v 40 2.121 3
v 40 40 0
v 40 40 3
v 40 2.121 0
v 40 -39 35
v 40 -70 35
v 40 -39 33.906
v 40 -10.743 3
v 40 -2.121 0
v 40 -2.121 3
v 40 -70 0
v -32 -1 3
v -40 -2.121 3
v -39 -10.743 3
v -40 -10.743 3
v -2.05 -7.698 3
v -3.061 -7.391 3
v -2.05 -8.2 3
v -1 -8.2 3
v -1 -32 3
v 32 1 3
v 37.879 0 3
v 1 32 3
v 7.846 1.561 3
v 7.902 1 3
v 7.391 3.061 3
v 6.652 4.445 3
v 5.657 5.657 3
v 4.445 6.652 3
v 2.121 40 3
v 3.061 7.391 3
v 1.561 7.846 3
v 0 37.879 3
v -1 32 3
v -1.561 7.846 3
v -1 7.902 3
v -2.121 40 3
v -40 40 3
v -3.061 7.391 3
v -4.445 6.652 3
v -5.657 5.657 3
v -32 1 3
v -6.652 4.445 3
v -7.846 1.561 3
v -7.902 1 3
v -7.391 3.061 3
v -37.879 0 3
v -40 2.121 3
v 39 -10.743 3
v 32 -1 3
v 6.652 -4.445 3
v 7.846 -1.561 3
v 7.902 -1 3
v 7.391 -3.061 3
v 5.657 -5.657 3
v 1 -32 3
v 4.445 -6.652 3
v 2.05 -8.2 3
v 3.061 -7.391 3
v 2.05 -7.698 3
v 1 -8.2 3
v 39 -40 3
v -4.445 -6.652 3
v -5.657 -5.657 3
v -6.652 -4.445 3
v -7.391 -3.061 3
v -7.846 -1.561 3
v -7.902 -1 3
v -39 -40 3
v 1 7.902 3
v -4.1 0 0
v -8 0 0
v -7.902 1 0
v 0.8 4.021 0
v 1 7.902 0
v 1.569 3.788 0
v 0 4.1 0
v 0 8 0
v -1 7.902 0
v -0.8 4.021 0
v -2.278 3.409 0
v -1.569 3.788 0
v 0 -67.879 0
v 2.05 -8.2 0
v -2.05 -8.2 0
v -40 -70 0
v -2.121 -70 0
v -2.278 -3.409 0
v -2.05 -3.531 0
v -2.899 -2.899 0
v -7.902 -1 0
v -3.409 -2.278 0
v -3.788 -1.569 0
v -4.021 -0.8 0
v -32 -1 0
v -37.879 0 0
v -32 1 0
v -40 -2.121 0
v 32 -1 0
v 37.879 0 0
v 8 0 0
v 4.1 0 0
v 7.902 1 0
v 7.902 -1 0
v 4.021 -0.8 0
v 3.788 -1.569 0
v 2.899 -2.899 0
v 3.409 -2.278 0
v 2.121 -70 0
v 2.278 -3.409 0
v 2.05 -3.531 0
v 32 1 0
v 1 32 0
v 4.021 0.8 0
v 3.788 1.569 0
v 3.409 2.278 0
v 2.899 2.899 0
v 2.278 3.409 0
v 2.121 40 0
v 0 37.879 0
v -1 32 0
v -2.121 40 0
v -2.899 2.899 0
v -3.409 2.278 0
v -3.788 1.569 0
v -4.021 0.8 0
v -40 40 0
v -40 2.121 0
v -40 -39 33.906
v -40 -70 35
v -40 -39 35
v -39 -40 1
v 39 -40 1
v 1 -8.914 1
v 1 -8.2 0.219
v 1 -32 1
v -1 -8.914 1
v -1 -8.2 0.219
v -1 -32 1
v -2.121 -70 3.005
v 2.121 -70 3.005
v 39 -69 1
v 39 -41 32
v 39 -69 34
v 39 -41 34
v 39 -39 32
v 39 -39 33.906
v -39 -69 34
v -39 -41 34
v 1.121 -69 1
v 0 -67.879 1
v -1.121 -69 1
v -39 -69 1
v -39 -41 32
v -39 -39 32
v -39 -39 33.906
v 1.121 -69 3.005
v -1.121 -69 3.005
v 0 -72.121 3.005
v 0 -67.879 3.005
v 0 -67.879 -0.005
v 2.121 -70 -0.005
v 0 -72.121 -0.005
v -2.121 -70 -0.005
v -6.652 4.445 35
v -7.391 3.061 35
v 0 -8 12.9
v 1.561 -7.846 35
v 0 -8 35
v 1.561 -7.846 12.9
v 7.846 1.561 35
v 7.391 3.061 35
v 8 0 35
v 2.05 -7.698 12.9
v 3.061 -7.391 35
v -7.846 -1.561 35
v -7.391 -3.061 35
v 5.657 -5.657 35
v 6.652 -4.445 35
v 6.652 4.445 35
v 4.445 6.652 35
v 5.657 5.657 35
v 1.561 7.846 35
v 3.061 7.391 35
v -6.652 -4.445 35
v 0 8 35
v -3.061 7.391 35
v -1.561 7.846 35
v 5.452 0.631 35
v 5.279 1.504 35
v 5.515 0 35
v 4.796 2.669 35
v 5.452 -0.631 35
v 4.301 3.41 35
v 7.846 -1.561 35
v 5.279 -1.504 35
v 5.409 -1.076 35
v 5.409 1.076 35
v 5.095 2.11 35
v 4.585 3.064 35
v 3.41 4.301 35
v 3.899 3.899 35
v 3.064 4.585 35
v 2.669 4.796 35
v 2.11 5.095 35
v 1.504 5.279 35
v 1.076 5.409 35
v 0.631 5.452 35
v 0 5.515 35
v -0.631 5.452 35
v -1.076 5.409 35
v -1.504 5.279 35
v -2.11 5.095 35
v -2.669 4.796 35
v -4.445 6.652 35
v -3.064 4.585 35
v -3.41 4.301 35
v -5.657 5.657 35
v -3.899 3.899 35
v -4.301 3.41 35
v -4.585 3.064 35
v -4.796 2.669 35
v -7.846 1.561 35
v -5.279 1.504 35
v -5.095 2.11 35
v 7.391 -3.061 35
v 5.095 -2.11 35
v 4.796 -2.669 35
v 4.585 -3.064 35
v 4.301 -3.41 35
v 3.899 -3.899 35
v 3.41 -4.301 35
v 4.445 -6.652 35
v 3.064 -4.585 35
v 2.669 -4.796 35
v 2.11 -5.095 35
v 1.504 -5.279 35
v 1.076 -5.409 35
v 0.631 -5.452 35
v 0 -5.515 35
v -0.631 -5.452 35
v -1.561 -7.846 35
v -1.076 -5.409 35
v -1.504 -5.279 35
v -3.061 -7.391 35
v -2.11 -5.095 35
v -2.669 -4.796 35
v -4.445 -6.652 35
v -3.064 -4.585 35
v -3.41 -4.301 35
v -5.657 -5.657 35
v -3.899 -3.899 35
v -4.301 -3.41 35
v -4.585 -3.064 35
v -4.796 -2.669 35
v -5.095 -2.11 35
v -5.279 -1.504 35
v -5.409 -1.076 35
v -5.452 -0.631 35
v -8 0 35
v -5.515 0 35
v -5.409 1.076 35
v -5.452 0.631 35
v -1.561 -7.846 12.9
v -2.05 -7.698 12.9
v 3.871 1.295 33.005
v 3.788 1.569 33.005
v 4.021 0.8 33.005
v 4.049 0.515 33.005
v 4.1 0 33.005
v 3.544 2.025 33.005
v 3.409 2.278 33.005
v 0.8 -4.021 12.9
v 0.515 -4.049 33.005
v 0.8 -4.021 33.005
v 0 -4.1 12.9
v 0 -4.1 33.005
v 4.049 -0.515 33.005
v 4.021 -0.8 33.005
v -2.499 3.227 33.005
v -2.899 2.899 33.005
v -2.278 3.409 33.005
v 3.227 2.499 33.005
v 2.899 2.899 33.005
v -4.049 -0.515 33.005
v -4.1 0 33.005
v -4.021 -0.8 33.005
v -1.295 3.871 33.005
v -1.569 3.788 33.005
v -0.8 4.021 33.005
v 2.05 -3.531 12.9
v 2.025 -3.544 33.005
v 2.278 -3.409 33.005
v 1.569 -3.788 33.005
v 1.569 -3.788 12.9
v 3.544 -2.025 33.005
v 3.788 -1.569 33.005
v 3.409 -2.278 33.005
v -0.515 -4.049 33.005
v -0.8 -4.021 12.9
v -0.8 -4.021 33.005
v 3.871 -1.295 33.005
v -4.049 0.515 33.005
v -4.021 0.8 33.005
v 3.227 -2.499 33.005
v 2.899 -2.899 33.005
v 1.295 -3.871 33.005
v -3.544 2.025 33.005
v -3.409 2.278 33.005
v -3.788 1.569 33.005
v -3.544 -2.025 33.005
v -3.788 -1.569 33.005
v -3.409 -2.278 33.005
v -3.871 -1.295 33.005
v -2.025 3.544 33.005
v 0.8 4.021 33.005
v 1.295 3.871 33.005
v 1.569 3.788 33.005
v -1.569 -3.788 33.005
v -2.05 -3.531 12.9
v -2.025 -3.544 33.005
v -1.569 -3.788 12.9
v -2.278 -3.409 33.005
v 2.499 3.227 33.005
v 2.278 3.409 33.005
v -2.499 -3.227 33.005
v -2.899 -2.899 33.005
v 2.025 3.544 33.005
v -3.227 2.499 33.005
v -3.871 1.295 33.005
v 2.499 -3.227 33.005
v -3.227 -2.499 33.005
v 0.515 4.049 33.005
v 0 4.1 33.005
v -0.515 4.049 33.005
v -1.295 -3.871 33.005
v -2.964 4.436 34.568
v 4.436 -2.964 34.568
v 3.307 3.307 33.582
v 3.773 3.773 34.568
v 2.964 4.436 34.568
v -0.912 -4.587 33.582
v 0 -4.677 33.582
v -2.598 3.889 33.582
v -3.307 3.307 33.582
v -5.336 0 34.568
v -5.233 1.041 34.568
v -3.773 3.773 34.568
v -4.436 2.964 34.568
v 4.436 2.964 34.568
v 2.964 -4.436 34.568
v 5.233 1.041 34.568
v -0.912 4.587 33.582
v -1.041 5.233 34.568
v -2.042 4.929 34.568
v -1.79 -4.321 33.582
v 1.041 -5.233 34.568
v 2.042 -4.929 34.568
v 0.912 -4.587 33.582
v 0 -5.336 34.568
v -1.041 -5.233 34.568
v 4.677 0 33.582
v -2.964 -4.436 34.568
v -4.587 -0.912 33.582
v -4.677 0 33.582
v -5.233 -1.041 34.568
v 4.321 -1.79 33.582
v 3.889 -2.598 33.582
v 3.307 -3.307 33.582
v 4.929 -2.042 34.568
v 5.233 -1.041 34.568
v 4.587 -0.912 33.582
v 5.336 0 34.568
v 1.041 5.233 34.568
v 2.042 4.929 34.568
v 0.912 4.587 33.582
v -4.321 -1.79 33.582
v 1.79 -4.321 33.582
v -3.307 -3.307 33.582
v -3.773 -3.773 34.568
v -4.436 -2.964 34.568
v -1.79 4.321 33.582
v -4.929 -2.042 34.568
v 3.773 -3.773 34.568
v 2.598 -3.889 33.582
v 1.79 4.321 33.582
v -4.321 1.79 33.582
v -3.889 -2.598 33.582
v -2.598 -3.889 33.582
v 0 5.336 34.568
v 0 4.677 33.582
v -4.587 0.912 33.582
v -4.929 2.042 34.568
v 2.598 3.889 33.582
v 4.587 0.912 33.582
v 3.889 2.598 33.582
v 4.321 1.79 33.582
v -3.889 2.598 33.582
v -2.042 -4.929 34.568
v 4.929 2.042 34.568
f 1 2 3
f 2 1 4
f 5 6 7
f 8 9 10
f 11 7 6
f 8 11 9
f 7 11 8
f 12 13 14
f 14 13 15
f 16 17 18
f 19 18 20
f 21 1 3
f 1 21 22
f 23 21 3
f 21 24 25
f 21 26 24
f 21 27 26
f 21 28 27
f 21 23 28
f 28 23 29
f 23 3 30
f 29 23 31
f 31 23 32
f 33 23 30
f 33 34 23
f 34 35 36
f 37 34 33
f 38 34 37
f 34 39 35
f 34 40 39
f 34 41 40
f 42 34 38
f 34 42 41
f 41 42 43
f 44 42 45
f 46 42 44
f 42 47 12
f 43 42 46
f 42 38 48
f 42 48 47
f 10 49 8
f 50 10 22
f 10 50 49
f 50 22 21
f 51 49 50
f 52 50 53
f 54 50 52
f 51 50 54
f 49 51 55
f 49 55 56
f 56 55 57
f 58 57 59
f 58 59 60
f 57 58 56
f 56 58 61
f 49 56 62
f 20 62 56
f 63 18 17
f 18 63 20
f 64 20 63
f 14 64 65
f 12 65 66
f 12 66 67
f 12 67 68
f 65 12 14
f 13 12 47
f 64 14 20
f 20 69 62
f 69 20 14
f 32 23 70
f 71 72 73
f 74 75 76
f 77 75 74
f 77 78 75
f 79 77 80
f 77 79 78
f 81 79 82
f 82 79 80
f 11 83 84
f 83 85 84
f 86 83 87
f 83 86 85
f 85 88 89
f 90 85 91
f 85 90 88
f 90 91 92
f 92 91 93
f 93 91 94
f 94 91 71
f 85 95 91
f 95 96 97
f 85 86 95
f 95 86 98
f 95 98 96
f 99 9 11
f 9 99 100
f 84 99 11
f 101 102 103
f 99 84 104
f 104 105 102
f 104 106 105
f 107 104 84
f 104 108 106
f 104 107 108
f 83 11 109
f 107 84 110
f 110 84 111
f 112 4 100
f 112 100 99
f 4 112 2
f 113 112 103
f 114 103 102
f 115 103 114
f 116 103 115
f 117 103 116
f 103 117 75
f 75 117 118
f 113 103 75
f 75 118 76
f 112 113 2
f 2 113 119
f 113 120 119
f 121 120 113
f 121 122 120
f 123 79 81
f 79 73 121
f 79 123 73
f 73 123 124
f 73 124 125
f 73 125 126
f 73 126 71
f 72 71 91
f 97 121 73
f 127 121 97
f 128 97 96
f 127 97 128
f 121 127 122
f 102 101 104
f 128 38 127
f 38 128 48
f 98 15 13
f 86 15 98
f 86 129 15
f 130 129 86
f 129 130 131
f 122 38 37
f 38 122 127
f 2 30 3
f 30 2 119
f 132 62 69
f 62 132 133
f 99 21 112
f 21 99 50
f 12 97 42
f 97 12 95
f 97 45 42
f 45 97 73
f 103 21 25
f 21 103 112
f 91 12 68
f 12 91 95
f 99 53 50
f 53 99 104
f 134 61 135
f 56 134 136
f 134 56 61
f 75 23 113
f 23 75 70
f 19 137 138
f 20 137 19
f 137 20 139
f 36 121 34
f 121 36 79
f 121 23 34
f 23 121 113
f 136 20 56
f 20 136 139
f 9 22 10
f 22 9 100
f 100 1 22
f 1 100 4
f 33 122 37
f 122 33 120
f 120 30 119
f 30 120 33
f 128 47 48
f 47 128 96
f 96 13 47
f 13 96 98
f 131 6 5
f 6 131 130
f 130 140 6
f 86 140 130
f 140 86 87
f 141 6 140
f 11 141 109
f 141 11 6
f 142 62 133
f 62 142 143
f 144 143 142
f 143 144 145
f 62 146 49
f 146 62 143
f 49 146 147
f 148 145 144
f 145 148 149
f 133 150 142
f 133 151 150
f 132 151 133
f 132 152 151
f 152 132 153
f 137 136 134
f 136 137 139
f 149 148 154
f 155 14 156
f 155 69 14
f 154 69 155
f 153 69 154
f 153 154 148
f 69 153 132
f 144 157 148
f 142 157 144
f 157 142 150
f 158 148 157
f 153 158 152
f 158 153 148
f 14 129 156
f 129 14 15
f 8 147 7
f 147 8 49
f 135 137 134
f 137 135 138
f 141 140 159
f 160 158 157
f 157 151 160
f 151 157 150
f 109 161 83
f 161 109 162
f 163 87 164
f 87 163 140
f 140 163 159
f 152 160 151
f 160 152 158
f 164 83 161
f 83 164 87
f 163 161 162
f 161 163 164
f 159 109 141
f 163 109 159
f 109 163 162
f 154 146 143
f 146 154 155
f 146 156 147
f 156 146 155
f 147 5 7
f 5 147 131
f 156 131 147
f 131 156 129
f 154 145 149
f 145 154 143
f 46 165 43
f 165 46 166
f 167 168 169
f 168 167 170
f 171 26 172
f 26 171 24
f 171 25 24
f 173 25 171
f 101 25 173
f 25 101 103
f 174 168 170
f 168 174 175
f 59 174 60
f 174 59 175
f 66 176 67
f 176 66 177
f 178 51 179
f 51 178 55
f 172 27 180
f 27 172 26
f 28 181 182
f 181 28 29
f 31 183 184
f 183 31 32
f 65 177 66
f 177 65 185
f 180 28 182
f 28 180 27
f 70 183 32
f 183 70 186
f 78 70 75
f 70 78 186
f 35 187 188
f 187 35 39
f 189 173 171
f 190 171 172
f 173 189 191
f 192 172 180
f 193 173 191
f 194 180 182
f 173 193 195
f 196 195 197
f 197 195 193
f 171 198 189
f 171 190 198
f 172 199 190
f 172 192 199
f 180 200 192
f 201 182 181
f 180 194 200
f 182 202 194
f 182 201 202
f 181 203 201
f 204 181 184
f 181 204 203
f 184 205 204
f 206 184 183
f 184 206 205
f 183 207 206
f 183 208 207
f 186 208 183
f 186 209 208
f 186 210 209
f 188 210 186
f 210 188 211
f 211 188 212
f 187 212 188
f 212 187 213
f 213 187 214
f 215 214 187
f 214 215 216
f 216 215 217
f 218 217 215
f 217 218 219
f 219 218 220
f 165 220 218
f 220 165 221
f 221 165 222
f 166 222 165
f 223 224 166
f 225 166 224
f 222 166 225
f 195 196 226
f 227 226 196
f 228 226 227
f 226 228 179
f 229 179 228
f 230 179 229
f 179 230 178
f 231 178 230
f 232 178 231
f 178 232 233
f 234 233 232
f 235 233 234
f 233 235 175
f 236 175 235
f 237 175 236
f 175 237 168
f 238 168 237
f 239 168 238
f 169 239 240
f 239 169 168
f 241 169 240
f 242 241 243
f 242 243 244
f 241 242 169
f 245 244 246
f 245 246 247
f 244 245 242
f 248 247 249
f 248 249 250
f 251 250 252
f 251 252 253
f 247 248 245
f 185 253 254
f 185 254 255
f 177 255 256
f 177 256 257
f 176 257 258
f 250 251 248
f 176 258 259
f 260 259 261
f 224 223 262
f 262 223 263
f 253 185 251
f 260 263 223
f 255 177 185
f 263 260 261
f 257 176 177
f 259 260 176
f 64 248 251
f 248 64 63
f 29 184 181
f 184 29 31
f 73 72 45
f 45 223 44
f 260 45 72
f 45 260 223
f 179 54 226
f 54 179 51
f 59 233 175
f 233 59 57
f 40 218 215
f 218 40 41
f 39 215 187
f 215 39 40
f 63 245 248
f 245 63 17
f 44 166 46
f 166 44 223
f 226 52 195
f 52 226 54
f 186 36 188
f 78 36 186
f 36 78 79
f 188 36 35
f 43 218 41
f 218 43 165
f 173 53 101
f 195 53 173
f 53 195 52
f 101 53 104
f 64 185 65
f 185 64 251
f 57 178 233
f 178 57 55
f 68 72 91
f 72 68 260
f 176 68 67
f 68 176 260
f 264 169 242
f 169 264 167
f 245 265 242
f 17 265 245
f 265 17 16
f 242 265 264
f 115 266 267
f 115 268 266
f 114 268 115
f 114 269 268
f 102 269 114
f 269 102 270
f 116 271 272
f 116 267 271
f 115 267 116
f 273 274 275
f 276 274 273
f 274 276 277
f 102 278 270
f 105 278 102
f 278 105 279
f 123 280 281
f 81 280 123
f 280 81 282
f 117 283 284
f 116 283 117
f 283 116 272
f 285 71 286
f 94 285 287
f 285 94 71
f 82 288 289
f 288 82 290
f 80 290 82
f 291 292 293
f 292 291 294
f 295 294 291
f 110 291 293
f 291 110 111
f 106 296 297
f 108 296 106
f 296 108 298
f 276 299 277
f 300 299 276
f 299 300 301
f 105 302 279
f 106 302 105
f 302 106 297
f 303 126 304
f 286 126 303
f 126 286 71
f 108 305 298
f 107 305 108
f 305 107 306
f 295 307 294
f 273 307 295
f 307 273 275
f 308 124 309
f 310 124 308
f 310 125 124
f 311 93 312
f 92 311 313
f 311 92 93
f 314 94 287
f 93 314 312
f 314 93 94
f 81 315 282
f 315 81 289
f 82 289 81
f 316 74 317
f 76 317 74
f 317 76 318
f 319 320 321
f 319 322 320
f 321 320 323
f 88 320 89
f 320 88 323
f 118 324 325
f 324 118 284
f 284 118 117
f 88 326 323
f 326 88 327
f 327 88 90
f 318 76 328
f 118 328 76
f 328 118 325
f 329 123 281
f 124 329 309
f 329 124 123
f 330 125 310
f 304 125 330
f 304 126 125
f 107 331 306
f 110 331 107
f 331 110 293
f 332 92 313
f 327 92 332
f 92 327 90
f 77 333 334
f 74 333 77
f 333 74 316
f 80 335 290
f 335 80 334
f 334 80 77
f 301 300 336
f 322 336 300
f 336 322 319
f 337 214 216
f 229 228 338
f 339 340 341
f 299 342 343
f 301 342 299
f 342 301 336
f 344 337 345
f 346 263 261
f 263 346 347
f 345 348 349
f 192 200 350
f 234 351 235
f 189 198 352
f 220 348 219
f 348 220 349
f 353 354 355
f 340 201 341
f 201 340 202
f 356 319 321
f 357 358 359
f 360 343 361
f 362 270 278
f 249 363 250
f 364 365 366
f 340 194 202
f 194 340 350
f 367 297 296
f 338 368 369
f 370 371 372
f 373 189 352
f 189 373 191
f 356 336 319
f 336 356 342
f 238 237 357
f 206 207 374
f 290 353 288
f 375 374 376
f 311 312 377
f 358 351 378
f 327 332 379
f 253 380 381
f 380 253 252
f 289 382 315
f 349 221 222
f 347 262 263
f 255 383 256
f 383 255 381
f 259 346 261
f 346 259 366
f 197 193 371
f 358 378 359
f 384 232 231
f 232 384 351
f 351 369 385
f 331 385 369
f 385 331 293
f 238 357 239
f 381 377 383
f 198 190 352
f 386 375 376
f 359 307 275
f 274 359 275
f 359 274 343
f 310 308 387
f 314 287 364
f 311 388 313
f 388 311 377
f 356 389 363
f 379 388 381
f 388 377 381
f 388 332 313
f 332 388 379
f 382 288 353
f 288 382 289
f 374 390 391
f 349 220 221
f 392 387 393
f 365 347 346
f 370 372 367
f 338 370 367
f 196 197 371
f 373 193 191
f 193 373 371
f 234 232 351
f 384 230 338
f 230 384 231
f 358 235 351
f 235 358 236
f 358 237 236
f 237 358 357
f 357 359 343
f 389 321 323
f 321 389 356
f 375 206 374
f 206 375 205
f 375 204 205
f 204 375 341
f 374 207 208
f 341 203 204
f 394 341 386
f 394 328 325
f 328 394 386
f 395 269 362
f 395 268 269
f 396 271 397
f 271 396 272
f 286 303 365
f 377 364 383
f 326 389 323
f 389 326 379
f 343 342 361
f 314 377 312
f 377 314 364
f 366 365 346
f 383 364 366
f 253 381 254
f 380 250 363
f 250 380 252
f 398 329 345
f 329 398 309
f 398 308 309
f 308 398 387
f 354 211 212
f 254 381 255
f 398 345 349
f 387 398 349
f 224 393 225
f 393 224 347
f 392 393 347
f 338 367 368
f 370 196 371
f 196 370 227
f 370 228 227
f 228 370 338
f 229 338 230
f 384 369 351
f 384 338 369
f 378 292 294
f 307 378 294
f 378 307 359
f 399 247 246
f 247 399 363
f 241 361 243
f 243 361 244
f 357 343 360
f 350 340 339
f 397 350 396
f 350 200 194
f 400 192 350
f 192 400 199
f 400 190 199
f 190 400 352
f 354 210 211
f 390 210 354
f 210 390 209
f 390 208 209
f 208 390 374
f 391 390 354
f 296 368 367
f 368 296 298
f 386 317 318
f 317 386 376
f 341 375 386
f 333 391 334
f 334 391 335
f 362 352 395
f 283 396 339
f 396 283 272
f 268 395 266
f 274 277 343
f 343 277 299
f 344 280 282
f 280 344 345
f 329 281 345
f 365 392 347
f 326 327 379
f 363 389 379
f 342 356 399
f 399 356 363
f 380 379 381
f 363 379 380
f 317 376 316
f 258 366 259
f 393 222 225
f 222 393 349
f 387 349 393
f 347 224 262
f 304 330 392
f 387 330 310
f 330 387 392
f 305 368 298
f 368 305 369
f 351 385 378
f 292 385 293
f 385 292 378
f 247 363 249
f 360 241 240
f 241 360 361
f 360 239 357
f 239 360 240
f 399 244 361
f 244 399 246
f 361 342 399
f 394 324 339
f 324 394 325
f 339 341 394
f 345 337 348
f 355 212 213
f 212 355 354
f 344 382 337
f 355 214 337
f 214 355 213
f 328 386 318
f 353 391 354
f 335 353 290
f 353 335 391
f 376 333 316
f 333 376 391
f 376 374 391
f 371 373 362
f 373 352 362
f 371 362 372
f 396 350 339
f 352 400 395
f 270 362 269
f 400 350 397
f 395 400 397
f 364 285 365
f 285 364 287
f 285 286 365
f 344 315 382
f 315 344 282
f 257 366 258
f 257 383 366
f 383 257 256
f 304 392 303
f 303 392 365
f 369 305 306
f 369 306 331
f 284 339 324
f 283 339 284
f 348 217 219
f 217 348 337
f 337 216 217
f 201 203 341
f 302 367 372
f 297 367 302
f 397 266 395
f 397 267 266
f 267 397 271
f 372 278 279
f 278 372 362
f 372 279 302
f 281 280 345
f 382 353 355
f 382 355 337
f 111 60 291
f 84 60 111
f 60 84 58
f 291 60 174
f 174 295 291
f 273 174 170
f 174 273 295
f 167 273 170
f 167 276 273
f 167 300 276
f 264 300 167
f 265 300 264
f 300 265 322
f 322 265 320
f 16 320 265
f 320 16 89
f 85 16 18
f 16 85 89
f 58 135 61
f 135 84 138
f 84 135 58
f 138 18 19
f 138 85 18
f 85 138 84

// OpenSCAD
// Drillguide and sawduct collector for drilling on wall
// By Leo Liang, 2018-7-28
//
// Remix on https://www.thingiverse.com/thing:3013962, by Coat, 08-jul-2018
// Licensed under the Creative Commons - Attribution license.

//Primary parameters
//diameter drill (mm), add a little tolerance
drill_diameter = 8.2;
//height of the  guidetube (mm)
guide_height = 35;
//width of the guidetube (mm)
guide_diameter = 16;
//thickness of the baseplate (mm)
plate_thick = 3;
//width of the baseplate (mm)
plate_width = 80;
// width of the sawdust collector (mm)
collector_width = 80; 
//depth of the sawdust collector (mm)
collector_depth = 30; 
//height of the sawdust collector (mm)
collector_height = 35; 
// thickness of the wall of the collector (mm)
collector_thick = 1;

module plate(w,t)
{
  translate([0,0,0.5 * plate_thick]) difference()
  {
    cube([w, w, t], center=true);
    cube([w/1.25, guidlinew, guide_height],center = true);
    cube([guidlinew, w/1.25, guide_height],center = true);
    
    translate([0.5*plate_width,0,-plate_thick/2])
      nodge();
    translate([0,0.5*plate_width,-plate_thick/2])
      nodge();
    translate([-0.5*plate_width,0,-plate_thick/2])
      nodge();
  }
} 

module nodge()
{
  translate([0,0,plate_thick/2]) rotate([0,0,45])
    cube([3,3,plate_thick+0.01], center=true);
}

module collector() {
  offset = min(collector_height, (plate_width-guide_diameter)/2);
  depth = collector_depth + offset;
  difference() {
    translate([0, offset/2, collector_height/2]) cube([collector_width, depth, collector_height], center=true);
    translate([0, offset/2+collector_thick, collector_height/2])
      cube([collector_width-collector_thick*2, depth, collector_height-collector_thick*2], center=true);
  	multmatrix(m=[[1, 0, 0, -collector_width/2-1],
  								[0, 1, -offset/collector_height, collector_depth/2+offset],
	  							[0, 0, 1, 0],
		  						[0, 0, 0, 1]])

      cube([collector_width+2, offset+1, collector_height+1]);
  }
  translate([0,offset/2-depth/2, 0]) nodge();
  // add a bean to strengthen thin wall
  translate([0, collector_depth/2, collector_height-1.5]) cube([collector_width, 2, 3], center=true);
}

//****************************************
//Main
//secondary parameters
$fn = 32;
guidlinew = min(2,drill_diameter/2);
dtop = (guide_diameter + drill_diameter)/2;
channel_height = min(guide_height/2, 10+plate_thick);

//The thing
difference()
{
  union()
  {
    color("red") cylinder(d = guide_diameter, h = guide_height);
    plate(plate_width,plate_thick);
    translate([0, -collector_depth/2-plate_width/2, 0]) collector();
  }  
  
  //drillhole
  cylinder(d = drill_diameter , h = guide_height*3, center = true);

  //edge in top drillguide to make it easier to insert drill
  translate([0,0,guide_height + dtop/5])
    sphere(d= dtop);

  //sawdust-channel
  translate([-drill_diameter/4,-drill_diameter,-0.1]) 
    cube([drill_diameter/2, drill_diameter, channel_height]); 
  
}
